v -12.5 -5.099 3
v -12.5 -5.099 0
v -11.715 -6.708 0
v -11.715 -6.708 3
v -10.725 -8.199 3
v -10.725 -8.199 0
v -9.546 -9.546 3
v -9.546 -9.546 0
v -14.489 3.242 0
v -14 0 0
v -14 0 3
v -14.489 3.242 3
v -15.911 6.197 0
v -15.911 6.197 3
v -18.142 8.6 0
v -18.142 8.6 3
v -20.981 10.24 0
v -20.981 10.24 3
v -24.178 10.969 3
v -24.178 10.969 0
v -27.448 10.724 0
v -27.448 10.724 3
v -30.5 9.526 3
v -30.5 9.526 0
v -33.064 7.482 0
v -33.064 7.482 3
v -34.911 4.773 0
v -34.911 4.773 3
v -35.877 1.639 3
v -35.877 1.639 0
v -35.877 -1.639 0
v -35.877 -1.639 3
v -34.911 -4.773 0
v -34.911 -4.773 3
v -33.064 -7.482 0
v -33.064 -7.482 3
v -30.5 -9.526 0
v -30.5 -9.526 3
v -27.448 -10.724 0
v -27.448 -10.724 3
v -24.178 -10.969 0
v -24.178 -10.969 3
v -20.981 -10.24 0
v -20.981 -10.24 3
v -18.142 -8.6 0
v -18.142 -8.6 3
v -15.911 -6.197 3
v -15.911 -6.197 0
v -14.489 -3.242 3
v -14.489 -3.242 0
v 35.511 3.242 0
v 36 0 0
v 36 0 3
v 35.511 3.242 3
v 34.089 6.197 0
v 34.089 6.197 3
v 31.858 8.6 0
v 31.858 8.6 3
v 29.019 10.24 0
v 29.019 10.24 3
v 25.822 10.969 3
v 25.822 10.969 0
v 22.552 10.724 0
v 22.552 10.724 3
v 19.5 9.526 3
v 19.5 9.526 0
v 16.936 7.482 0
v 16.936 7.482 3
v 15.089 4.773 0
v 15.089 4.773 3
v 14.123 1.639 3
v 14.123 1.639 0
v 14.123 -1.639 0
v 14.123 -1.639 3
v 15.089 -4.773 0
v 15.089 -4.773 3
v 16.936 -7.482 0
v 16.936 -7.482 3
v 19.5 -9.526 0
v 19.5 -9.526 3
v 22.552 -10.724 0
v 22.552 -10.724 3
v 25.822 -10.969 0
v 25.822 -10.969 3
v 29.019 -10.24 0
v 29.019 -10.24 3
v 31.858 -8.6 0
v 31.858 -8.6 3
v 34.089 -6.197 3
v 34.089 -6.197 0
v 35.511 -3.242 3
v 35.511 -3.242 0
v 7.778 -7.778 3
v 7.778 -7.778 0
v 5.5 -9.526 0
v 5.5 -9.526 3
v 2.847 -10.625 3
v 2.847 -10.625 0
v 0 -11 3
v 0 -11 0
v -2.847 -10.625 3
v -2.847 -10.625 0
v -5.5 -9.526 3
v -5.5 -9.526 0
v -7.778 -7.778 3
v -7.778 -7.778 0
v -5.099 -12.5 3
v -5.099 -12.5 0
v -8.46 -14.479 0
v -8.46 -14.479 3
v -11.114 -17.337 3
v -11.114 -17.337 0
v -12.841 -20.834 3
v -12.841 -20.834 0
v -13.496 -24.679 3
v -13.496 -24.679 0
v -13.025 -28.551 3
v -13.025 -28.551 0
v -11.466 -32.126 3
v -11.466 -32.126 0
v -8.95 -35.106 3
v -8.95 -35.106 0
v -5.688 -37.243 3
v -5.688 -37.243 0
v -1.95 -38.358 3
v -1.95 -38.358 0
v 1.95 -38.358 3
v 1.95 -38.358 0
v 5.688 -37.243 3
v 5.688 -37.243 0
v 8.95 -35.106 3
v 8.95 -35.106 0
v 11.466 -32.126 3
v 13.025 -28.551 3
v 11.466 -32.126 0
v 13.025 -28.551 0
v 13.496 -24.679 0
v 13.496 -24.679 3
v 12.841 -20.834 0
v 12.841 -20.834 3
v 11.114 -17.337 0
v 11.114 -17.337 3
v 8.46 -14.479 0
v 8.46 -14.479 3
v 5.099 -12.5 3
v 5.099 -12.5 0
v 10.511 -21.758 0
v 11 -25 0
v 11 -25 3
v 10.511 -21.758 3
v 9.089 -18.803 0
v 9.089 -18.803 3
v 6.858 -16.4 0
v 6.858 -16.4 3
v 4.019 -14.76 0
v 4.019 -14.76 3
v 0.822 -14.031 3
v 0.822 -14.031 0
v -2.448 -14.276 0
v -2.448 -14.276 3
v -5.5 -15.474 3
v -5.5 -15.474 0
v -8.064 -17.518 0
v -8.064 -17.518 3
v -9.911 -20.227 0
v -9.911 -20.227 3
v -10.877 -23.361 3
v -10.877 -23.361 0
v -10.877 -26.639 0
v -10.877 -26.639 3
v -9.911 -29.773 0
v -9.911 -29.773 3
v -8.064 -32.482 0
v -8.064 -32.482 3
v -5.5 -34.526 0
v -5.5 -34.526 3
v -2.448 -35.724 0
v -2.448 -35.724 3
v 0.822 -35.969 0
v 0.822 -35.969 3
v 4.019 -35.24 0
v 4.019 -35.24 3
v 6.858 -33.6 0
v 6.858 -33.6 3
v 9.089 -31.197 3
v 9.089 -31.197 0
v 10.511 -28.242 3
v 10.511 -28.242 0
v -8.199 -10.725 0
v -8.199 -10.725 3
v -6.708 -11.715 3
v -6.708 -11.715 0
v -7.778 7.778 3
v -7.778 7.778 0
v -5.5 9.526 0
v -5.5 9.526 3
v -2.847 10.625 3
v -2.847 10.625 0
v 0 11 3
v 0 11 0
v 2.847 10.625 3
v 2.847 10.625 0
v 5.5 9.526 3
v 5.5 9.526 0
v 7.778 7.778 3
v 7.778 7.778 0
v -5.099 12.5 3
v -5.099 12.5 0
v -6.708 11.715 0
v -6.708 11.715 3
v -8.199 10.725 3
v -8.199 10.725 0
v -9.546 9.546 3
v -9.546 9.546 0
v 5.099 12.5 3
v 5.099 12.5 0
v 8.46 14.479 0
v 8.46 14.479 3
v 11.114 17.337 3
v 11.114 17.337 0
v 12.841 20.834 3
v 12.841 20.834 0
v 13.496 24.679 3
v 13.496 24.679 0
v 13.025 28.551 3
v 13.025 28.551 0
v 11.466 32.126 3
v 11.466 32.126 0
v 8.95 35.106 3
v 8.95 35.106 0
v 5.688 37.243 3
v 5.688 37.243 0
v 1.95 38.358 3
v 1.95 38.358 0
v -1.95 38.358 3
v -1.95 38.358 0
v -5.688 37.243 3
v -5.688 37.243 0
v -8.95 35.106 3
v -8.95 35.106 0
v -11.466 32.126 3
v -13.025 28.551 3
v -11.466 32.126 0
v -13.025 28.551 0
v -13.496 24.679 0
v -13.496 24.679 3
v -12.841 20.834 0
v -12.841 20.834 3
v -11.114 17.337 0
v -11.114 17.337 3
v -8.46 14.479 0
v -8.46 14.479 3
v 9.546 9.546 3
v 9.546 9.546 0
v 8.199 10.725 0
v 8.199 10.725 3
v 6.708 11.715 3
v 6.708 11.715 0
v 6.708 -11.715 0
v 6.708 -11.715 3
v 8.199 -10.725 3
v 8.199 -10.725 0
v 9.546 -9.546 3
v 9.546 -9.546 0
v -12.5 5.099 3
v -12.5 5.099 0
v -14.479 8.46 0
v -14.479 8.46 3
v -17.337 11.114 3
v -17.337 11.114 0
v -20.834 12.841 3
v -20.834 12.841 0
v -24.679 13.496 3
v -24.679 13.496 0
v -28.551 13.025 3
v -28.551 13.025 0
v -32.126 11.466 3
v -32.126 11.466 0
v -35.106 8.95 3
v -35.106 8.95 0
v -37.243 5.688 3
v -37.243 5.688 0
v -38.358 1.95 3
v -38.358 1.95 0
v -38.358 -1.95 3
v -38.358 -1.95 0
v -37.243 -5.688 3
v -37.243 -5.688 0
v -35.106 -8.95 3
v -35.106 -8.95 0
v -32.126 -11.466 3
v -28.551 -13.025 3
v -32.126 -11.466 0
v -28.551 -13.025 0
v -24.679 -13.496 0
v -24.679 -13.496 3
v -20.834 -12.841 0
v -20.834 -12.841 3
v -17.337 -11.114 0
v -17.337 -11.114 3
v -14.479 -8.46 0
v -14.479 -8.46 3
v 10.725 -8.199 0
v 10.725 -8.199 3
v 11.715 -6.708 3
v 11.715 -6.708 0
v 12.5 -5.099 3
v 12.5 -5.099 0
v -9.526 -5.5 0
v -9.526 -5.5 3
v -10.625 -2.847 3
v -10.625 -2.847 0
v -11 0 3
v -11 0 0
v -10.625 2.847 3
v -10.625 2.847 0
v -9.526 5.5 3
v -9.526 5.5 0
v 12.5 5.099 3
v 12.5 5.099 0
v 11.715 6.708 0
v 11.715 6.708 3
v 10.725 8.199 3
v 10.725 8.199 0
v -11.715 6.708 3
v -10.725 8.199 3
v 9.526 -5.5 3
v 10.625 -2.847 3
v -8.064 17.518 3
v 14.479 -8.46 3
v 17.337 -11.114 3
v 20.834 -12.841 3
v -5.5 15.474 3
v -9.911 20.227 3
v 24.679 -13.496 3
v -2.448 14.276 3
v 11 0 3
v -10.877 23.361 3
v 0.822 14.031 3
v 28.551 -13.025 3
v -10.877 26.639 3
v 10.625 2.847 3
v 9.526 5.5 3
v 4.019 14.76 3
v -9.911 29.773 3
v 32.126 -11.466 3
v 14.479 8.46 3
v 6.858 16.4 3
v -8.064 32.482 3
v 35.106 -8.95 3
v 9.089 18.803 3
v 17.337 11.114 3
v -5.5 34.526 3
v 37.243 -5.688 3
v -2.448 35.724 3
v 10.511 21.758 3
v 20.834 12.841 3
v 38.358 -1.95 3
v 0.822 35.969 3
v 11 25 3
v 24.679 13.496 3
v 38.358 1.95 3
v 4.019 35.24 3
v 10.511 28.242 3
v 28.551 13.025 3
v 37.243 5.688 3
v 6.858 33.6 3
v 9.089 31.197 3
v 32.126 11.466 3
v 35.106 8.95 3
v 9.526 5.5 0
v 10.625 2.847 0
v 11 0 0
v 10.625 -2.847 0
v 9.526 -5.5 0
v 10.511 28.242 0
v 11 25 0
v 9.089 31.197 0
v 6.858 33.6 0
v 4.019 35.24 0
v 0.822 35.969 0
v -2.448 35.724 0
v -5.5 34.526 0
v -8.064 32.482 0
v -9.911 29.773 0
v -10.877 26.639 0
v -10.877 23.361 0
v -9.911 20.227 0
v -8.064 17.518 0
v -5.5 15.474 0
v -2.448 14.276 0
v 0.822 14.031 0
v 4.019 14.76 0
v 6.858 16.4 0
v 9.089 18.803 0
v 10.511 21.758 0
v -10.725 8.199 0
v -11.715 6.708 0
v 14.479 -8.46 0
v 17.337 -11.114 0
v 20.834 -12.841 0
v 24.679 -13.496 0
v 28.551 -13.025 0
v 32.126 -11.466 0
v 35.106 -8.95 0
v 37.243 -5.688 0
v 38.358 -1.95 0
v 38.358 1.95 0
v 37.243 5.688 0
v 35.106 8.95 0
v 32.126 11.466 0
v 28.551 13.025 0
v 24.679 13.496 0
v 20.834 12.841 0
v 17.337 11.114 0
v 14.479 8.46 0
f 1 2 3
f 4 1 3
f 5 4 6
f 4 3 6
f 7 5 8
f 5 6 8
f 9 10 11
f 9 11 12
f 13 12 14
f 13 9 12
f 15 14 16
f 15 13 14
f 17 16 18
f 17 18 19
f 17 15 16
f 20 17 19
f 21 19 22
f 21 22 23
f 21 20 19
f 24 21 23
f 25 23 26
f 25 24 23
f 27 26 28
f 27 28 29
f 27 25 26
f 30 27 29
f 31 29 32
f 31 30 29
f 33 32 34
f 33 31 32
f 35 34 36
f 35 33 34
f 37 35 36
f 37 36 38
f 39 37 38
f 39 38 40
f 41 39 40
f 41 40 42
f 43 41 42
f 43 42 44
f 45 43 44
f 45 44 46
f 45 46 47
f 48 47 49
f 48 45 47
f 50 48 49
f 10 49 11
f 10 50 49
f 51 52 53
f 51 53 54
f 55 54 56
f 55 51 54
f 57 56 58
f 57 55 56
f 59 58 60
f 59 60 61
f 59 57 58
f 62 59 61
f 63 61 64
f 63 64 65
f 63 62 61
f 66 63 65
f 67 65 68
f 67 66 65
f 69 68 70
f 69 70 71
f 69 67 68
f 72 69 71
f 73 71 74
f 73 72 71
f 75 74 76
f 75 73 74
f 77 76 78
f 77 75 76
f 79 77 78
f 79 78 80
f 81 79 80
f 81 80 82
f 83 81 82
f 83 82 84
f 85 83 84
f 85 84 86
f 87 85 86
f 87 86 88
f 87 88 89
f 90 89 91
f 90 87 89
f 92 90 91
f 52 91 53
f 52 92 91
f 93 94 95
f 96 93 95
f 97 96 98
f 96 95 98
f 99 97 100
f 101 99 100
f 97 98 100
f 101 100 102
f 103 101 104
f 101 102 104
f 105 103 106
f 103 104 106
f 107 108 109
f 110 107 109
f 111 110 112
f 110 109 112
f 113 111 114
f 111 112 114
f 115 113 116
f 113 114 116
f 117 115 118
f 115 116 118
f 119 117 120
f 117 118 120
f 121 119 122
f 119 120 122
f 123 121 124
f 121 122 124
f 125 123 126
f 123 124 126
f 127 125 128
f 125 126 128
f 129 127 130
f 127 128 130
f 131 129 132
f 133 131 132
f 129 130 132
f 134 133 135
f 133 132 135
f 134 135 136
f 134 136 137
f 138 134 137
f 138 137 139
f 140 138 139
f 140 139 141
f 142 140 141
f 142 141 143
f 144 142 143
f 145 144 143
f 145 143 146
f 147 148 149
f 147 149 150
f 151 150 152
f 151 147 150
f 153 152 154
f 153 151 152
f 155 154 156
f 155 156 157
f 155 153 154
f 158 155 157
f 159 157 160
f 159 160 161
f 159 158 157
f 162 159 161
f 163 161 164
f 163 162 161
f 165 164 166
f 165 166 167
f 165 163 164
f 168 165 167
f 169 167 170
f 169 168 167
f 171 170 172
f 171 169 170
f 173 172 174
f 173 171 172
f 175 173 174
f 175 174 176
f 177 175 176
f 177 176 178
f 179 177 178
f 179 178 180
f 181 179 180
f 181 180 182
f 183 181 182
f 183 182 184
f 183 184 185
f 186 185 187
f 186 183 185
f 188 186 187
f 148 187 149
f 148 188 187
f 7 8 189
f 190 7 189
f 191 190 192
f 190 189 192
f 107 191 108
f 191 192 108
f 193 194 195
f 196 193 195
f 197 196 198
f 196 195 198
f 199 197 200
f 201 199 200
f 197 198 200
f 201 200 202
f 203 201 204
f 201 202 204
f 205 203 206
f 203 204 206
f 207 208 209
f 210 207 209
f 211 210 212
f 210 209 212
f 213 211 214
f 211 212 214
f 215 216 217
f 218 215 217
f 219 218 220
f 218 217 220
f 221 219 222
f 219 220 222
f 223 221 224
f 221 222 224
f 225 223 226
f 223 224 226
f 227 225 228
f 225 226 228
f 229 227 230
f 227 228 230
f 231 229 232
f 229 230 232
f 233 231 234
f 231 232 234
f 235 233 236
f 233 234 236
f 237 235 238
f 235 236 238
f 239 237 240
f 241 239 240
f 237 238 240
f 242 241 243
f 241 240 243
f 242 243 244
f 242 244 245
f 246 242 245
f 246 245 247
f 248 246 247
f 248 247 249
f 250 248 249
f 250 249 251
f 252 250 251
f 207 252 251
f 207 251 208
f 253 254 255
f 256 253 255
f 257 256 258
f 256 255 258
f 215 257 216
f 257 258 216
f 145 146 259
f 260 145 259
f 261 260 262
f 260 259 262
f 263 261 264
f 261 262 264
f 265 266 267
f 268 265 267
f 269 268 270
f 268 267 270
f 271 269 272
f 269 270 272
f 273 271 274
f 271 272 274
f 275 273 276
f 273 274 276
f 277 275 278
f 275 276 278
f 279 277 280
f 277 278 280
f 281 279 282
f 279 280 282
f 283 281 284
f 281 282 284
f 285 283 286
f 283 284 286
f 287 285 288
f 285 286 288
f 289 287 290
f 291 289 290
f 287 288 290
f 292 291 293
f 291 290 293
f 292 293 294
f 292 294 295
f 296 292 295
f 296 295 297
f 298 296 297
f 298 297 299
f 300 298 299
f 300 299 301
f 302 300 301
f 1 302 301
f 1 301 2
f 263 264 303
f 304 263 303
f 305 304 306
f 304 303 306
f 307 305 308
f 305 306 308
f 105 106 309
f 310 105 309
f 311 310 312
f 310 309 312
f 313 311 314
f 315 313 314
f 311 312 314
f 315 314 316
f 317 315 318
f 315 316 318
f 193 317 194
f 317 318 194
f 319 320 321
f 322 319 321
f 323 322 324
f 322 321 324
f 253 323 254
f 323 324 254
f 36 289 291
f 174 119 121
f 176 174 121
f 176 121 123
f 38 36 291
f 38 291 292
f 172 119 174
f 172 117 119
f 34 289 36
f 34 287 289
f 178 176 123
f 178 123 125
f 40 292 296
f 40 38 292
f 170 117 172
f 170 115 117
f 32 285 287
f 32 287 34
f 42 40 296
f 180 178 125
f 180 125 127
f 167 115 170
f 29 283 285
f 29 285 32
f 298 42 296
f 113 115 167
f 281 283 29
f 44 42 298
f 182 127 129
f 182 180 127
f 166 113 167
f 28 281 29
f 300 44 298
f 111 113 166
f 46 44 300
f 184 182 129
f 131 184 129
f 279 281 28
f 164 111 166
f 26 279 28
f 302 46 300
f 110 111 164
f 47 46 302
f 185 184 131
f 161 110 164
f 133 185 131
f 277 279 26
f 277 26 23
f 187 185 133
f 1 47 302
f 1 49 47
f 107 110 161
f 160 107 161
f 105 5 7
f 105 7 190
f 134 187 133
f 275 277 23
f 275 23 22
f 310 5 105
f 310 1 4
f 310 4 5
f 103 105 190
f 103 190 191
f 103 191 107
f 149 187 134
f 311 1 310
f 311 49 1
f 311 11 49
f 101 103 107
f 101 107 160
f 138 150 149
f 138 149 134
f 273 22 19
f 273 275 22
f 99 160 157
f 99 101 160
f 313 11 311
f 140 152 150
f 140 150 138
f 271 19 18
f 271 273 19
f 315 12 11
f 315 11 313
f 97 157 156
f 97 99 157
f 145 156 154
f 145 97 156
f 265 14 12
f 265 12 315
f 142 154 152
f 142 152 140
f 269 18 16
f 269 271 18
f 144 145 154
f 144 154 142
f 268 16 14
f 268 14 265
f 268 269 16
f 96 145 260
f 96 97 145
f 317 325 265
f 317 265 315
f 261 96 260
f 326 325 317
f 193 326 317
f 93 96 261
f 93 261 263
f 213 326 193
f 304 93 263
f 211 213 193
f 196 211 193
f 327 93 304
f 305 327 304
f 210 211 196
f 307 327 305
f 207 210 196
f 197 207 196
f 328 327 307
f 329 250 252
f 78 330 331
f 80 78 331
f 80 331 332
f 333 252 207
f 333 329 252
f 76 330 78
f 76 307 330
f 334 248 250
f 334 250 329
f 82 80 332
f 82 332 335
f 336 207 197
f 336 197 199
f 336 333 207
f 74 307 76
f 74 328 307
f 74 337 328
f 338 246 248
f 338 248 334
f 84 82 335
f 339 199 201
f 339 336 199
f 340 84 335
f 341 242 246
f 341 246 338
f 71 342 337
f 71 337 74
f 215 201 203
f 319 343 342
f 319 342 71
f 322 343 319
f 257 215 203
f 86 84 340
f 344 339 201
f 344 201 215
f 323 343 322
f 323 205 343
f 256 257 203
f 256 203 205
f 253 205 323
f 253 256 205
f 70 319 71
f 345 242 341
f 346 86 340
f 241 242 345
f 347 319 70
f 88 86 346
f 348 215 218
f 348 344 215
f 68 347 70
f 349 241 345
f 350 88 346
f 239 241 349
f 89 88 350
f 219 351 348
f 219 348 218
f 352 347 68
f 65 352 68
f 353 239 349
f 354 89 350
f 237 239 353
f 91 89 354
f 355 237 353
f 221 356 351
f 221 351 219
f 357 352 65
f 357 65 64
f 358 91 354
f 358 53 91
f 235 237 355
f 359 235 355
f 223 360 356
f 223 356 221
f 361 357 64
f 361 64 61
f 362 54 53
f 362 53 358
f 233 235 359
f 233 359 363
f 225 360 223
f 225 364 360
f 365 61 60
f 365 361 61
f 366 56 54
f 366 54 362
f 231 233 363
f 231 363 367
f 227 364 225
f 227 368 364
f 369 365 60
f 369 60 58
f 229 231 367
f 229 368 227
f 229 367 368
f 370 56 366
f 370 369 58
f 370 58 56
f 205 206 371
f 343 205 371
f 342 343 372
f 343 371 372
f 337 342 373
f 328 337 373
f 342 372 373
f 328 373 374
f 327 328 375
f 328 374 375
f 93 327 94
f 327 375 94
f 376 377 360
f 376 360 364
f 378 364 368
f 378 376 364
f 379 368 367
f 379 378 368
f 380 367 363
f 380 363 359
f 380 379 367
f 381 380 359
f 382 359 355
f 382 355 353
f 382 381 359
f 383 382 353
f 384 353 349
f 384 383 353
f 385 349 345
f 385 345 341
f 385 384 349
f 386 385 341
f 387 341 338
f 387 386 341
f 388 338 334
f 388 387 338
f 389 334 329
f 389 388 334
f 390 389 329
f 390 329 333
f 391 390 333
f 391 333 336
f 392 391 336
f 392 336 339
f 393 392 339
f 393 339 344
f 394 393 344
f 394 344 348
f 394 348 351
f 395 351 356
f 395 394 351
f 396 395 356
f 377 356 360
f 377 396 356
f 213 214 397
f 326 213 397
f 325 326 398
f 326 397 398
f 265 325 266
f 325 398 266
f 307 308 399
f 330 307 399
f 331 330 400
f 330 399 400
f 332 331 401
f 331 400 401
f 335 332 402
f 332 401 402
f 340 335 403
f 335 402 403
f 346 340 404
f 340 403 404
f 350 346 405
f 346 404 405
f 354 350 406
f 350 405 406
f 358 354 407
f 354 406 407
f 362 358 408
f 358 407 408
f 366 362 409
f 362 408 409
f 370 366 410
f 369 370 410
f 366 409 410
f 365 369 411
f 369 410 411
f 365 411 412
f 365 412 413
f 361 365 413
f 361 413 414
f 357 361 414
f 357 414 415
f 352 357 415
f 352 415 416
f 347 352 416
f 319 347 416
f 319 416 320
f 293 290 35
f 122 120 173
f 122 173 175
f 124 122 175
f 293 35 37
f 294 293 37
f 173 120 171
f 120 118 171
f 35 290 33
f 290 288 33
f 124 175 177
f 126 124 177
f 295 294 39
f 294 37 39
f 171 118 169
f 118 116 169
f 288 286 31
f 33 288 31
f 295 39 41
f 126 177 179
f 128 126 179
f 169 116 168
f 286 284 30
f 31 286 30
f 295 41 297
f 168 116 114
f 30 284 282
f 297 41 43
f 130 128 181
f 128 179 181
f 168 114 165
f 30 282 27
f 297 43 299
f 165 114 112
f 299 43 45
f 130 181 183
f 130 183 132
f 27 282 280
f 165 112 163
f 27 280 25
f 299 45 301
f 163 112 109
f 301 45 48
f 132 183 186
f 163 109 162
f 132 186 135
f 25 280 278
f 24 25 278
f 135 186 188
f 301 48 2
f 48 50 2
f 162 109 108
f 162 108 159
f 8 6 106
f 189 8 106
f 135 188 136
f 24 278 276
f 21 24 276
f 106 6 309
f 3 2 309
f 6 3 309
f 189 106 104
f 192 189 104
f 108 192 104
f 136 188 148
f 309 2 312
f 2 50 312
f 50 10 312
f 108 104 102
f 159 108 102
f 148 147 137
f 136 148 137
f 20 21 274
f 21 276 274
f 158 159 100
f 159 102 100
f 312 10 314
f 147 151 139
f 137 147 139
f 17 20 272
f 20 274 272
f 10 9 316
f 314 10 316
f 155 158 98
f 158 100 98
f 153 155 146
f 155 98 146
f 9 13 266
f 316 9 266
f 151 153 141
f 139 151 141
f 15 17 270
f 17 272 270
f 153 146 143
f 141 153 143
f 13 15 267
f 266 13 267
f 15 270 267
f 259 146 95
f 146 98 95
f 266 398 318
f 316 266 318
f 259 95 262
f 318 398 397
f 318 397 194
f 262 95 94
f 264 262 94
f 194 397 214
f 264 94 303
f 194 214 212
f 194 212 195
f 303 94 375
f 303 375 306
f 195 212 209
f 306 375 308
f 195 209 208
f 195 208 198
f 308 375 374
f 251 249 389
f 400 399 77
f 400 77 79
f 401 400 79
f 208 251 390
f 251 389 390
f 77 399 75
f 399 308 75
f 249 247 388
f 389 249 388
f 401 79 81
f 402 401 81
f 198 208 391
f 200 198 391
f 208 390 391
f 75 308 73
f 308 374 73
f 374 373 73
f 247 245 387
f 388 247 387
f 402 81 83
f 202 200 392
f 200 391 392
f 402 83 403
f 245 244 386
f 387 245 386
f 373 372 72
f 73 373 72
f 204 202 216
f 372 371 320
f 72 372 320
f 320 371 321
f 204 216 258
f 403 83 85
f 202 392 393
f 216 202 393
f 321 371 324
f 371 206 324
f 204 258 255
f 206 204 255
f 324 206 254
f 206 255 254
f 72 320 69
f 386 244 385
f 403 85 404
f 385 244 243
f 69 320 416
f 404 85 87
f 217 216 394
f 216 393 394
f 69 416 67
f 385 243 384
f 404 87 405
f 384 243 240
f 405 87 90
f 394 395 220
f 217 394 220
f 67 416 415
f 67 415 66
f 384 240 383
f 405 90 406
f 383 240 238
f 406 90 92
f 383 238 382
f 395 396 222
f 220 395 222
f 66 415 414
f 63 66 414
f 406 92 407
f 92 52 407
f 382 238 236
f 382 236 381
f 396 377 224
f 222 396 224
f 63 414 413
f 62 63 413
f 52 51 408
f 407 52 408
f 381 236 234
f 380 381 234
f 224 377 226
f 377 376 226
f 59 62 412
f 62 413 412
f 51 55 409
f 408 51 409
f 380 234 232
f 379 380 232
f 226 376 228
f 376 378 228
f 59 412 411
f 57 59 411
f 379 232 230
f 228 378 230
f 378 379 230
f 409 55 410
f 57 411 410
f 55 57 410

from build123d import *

# Parameters (mm, degrees)
F0_R     = 11
F1_DEPTH = 3


with BuildPart() as f1:
    # F0 (on Top) → F1 (new body)
    with BuildSketch(Plane.XY):
        with BuildLine():
            ThreePointArc((5.09902, 12.5), (0, 38.5), (-5.09902, 12.5))
            ThreePointArc((-5.09902, 12.5), (-7.469962, 11.244984), (-9.545942, 9.545942))
            ThreePointArc((-9.545942, 9.545942), (-11.244984, 7.469962), (-12.5, 5.09902))
            ThreePointArc((-12.5, 5.09902), (-38.5, 0), (-12.5, -5.09902))
            ThreePointArc((-12.5, -5.09902), (-11.244984, -7.469962), (-9.545942, -9.545942))
            ThreePointArc((-9.545942, -9.545942), (-7.469962, -11.244984), (-5.09902, -12.5))
            ThreePointArc((-5.09902, -12.5), (0, -38.5), (5.09902, -12.5))
            ThreePointArc((5.09902, -12.5), (7.469962, -11.244984), (9.545942, -9.545942))
            ThreePointArc((9.545942, -9.545942), (11.244984, -7.469962), (12.5, -5.09902))
            ThreePointArc((12.5, -5.09902), (38.5, 0), (12.5, 5.09902))
            ThreePointArc((12.5, 5.09902), (11.244984, 7.469962), (9.545942, 9.545942))
            ThreePointArc((9.545942, 9.545942), (7.469962, 11.244984), (5.09902, 12.5))
        make_face()
        with Locations((0, -25)):
            Circle(F0_R, mode=Mode.SUBTRACT)
        with Locations((-25, 0)):
            Circle(F0_R, mode=Mode.SUBTRACT)
        with BuildLine():
            ThreePointArc((-7.778175, 7.778175), (0, 11), (7.778175, 7.778175))
            ThreePointArc((7.778175, 7.778175), (11, 0), (7.778175, -7.778175))
            ThreePointArc((7.778175, -7.778175), (0, -11), (-7.778175, -7.778175))
            ThreePointArc((-7.778175, -7.778175), (-11, 0), (-7.778175, 7.778175))
        make_face(mode=Mode.SUBTRACT)
        with Locations((25, 0)):
            Circle(F0_R, mode=Mode.SUBTRACT)
        with Locations((0, 25)):
            Circle(F0_R, mode=Mode.SUBTRACT)
    extrude(amount=F1_DEPTH)


solid = f1.part
